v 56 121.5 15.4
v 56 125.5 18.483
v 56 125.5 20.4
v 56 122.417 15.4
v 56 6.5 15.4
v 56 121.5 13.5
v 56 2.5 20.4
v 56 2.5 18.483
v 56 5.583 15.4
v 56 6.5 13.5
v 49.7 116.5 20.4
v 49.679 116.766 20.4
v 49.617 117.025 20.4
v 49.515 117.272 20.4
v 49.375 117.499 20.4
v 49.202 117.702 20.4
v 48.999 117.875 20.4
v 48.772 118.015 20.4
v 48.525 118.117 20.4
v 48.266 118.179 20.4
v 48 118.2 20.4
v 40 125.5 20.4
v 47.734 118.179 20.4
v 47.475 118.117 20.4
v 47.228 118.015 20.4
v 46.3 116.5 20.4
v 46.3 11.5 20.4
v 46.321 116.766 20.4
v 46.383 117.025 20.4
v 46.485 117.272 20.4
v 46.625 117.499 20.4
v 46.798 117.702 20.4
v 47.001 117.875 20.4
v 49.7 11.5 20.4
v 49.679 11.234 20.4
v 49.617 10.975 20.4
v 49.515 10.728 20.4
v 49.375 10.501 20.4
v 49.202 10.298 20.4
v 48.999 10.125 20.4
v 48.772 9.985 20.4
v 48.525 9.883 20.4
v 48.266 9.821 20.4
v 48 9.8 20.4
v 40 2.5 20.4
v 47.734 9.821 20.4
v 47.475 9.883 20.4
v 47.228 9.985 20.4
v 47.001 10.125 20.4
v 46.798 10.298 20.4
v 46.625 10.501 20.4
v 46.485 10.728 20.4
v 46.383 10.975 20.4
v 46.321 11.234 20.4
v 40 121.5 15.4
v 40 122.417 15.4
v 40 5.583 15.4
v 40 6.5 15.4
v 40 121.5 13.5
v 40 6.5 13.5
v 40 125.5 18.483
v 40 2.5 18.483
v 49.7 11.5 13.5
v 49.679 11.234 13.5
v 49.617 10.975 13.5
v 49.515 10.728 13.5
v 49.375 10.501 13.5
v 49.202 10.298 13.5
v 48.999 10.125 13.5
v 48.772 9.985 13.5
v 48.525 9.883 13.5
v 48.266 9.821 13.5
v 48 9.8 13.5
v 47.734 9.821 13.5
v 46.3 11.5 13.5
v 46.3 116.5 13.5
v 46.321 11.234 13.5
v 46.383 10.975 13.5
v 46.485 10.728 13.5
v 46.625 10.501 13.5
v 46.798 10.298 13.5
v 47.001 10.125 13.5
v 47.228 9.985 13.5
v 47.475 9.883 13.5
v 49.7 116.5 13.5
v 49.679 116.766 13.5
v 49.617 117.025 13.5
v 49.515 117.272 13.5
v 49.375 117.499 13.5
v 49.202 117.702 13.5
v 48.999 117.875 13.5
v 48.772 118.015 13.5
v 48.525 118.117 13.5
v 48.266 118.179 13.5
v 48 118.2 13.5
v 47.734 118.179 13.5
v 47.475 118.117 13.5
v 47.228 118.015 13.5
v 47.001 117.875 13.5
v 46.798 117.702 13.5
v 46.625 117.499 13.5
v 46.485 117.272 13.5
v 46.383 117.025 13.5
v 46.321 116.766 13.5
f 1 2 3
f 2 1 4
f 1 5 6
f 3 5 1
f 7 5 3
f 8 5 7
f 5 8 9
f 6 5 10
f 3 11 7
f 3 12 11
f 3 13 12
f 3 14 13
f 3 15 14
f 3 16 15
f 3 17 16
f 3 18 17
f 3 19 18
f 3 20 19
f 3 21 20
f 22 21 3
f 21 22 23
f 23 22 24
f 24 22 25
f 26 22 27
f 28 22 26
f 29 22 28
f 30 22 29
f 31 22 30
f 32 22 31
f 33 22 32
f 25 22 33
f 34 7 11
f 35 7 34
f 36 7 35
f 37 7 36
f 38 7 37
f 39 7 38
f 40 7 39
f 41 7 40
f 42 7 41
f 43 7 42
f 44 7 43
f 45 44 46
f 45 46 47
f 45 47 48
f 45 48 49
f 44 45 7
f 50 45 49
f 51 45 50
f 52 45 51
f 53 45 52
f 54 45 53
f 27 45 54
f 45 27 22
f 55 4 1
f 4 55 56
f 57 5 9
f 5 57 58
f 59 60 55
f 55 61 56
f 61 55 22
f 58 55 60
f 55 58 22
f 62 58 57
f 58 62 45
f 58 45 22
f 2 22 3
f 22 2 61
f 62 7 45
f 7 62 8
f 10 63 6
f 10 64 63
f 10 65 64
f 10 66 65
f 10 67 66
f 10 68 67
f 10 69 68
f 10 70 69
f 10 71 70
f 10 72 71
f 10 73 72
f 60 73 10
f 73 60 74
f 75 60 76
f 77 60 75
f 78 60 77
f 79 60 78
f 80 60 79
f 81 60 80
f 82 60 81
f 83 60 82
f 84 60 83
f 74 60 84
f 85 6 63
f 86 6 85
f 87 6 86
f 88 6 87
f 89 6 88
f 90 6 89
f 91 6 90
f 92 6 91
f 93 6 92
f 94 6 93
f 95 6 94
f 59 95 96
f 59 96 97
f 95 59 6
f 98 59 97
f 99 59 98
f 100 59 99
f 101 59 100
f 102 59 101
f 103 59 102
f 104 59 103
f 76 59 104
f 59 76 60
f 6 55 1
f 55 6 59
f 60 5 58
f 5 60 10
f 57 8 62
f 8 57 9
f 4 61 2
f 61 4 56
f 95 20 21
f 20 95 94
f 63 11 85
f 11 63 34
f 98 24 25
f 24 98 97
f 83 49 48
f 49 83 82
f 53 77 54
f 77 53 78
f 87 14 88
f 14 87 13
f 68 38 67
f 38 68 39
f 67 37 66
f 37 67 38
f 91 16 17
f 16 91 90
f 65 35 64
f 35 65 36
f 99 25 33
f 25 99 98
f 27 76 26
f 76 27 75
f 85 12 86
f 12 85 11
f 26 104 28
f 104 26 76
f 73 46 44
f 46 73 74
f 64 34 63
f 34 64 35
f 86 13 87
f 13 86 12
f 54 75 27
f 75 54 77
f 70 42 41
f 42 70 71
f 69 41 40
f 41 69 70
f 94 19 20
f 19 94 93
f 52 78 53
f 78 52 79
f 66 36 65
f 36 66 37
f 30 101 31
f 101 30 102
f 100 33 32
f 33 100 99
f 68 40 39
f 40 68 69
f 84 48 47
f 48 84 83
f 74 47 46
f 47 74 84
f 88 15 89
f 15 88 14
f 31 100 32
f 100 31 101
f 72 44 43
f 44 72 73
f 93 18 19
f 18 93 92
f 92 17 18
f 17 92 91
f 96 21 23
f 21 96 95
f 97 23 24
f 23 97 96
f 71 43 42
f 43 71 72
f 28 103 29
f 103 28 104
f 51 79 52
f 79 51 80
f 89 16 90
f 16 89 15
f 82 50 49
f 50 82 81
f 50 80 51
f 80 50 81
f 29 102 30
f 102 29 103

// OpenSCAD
// TailWatch S3 enclosure -- strap #1 (strap_xs[0]), ASSEMBLY position.
include <../tailwatch_lib.scad>
translate([strap_xs[0], 0, 0]) strap_raw();
